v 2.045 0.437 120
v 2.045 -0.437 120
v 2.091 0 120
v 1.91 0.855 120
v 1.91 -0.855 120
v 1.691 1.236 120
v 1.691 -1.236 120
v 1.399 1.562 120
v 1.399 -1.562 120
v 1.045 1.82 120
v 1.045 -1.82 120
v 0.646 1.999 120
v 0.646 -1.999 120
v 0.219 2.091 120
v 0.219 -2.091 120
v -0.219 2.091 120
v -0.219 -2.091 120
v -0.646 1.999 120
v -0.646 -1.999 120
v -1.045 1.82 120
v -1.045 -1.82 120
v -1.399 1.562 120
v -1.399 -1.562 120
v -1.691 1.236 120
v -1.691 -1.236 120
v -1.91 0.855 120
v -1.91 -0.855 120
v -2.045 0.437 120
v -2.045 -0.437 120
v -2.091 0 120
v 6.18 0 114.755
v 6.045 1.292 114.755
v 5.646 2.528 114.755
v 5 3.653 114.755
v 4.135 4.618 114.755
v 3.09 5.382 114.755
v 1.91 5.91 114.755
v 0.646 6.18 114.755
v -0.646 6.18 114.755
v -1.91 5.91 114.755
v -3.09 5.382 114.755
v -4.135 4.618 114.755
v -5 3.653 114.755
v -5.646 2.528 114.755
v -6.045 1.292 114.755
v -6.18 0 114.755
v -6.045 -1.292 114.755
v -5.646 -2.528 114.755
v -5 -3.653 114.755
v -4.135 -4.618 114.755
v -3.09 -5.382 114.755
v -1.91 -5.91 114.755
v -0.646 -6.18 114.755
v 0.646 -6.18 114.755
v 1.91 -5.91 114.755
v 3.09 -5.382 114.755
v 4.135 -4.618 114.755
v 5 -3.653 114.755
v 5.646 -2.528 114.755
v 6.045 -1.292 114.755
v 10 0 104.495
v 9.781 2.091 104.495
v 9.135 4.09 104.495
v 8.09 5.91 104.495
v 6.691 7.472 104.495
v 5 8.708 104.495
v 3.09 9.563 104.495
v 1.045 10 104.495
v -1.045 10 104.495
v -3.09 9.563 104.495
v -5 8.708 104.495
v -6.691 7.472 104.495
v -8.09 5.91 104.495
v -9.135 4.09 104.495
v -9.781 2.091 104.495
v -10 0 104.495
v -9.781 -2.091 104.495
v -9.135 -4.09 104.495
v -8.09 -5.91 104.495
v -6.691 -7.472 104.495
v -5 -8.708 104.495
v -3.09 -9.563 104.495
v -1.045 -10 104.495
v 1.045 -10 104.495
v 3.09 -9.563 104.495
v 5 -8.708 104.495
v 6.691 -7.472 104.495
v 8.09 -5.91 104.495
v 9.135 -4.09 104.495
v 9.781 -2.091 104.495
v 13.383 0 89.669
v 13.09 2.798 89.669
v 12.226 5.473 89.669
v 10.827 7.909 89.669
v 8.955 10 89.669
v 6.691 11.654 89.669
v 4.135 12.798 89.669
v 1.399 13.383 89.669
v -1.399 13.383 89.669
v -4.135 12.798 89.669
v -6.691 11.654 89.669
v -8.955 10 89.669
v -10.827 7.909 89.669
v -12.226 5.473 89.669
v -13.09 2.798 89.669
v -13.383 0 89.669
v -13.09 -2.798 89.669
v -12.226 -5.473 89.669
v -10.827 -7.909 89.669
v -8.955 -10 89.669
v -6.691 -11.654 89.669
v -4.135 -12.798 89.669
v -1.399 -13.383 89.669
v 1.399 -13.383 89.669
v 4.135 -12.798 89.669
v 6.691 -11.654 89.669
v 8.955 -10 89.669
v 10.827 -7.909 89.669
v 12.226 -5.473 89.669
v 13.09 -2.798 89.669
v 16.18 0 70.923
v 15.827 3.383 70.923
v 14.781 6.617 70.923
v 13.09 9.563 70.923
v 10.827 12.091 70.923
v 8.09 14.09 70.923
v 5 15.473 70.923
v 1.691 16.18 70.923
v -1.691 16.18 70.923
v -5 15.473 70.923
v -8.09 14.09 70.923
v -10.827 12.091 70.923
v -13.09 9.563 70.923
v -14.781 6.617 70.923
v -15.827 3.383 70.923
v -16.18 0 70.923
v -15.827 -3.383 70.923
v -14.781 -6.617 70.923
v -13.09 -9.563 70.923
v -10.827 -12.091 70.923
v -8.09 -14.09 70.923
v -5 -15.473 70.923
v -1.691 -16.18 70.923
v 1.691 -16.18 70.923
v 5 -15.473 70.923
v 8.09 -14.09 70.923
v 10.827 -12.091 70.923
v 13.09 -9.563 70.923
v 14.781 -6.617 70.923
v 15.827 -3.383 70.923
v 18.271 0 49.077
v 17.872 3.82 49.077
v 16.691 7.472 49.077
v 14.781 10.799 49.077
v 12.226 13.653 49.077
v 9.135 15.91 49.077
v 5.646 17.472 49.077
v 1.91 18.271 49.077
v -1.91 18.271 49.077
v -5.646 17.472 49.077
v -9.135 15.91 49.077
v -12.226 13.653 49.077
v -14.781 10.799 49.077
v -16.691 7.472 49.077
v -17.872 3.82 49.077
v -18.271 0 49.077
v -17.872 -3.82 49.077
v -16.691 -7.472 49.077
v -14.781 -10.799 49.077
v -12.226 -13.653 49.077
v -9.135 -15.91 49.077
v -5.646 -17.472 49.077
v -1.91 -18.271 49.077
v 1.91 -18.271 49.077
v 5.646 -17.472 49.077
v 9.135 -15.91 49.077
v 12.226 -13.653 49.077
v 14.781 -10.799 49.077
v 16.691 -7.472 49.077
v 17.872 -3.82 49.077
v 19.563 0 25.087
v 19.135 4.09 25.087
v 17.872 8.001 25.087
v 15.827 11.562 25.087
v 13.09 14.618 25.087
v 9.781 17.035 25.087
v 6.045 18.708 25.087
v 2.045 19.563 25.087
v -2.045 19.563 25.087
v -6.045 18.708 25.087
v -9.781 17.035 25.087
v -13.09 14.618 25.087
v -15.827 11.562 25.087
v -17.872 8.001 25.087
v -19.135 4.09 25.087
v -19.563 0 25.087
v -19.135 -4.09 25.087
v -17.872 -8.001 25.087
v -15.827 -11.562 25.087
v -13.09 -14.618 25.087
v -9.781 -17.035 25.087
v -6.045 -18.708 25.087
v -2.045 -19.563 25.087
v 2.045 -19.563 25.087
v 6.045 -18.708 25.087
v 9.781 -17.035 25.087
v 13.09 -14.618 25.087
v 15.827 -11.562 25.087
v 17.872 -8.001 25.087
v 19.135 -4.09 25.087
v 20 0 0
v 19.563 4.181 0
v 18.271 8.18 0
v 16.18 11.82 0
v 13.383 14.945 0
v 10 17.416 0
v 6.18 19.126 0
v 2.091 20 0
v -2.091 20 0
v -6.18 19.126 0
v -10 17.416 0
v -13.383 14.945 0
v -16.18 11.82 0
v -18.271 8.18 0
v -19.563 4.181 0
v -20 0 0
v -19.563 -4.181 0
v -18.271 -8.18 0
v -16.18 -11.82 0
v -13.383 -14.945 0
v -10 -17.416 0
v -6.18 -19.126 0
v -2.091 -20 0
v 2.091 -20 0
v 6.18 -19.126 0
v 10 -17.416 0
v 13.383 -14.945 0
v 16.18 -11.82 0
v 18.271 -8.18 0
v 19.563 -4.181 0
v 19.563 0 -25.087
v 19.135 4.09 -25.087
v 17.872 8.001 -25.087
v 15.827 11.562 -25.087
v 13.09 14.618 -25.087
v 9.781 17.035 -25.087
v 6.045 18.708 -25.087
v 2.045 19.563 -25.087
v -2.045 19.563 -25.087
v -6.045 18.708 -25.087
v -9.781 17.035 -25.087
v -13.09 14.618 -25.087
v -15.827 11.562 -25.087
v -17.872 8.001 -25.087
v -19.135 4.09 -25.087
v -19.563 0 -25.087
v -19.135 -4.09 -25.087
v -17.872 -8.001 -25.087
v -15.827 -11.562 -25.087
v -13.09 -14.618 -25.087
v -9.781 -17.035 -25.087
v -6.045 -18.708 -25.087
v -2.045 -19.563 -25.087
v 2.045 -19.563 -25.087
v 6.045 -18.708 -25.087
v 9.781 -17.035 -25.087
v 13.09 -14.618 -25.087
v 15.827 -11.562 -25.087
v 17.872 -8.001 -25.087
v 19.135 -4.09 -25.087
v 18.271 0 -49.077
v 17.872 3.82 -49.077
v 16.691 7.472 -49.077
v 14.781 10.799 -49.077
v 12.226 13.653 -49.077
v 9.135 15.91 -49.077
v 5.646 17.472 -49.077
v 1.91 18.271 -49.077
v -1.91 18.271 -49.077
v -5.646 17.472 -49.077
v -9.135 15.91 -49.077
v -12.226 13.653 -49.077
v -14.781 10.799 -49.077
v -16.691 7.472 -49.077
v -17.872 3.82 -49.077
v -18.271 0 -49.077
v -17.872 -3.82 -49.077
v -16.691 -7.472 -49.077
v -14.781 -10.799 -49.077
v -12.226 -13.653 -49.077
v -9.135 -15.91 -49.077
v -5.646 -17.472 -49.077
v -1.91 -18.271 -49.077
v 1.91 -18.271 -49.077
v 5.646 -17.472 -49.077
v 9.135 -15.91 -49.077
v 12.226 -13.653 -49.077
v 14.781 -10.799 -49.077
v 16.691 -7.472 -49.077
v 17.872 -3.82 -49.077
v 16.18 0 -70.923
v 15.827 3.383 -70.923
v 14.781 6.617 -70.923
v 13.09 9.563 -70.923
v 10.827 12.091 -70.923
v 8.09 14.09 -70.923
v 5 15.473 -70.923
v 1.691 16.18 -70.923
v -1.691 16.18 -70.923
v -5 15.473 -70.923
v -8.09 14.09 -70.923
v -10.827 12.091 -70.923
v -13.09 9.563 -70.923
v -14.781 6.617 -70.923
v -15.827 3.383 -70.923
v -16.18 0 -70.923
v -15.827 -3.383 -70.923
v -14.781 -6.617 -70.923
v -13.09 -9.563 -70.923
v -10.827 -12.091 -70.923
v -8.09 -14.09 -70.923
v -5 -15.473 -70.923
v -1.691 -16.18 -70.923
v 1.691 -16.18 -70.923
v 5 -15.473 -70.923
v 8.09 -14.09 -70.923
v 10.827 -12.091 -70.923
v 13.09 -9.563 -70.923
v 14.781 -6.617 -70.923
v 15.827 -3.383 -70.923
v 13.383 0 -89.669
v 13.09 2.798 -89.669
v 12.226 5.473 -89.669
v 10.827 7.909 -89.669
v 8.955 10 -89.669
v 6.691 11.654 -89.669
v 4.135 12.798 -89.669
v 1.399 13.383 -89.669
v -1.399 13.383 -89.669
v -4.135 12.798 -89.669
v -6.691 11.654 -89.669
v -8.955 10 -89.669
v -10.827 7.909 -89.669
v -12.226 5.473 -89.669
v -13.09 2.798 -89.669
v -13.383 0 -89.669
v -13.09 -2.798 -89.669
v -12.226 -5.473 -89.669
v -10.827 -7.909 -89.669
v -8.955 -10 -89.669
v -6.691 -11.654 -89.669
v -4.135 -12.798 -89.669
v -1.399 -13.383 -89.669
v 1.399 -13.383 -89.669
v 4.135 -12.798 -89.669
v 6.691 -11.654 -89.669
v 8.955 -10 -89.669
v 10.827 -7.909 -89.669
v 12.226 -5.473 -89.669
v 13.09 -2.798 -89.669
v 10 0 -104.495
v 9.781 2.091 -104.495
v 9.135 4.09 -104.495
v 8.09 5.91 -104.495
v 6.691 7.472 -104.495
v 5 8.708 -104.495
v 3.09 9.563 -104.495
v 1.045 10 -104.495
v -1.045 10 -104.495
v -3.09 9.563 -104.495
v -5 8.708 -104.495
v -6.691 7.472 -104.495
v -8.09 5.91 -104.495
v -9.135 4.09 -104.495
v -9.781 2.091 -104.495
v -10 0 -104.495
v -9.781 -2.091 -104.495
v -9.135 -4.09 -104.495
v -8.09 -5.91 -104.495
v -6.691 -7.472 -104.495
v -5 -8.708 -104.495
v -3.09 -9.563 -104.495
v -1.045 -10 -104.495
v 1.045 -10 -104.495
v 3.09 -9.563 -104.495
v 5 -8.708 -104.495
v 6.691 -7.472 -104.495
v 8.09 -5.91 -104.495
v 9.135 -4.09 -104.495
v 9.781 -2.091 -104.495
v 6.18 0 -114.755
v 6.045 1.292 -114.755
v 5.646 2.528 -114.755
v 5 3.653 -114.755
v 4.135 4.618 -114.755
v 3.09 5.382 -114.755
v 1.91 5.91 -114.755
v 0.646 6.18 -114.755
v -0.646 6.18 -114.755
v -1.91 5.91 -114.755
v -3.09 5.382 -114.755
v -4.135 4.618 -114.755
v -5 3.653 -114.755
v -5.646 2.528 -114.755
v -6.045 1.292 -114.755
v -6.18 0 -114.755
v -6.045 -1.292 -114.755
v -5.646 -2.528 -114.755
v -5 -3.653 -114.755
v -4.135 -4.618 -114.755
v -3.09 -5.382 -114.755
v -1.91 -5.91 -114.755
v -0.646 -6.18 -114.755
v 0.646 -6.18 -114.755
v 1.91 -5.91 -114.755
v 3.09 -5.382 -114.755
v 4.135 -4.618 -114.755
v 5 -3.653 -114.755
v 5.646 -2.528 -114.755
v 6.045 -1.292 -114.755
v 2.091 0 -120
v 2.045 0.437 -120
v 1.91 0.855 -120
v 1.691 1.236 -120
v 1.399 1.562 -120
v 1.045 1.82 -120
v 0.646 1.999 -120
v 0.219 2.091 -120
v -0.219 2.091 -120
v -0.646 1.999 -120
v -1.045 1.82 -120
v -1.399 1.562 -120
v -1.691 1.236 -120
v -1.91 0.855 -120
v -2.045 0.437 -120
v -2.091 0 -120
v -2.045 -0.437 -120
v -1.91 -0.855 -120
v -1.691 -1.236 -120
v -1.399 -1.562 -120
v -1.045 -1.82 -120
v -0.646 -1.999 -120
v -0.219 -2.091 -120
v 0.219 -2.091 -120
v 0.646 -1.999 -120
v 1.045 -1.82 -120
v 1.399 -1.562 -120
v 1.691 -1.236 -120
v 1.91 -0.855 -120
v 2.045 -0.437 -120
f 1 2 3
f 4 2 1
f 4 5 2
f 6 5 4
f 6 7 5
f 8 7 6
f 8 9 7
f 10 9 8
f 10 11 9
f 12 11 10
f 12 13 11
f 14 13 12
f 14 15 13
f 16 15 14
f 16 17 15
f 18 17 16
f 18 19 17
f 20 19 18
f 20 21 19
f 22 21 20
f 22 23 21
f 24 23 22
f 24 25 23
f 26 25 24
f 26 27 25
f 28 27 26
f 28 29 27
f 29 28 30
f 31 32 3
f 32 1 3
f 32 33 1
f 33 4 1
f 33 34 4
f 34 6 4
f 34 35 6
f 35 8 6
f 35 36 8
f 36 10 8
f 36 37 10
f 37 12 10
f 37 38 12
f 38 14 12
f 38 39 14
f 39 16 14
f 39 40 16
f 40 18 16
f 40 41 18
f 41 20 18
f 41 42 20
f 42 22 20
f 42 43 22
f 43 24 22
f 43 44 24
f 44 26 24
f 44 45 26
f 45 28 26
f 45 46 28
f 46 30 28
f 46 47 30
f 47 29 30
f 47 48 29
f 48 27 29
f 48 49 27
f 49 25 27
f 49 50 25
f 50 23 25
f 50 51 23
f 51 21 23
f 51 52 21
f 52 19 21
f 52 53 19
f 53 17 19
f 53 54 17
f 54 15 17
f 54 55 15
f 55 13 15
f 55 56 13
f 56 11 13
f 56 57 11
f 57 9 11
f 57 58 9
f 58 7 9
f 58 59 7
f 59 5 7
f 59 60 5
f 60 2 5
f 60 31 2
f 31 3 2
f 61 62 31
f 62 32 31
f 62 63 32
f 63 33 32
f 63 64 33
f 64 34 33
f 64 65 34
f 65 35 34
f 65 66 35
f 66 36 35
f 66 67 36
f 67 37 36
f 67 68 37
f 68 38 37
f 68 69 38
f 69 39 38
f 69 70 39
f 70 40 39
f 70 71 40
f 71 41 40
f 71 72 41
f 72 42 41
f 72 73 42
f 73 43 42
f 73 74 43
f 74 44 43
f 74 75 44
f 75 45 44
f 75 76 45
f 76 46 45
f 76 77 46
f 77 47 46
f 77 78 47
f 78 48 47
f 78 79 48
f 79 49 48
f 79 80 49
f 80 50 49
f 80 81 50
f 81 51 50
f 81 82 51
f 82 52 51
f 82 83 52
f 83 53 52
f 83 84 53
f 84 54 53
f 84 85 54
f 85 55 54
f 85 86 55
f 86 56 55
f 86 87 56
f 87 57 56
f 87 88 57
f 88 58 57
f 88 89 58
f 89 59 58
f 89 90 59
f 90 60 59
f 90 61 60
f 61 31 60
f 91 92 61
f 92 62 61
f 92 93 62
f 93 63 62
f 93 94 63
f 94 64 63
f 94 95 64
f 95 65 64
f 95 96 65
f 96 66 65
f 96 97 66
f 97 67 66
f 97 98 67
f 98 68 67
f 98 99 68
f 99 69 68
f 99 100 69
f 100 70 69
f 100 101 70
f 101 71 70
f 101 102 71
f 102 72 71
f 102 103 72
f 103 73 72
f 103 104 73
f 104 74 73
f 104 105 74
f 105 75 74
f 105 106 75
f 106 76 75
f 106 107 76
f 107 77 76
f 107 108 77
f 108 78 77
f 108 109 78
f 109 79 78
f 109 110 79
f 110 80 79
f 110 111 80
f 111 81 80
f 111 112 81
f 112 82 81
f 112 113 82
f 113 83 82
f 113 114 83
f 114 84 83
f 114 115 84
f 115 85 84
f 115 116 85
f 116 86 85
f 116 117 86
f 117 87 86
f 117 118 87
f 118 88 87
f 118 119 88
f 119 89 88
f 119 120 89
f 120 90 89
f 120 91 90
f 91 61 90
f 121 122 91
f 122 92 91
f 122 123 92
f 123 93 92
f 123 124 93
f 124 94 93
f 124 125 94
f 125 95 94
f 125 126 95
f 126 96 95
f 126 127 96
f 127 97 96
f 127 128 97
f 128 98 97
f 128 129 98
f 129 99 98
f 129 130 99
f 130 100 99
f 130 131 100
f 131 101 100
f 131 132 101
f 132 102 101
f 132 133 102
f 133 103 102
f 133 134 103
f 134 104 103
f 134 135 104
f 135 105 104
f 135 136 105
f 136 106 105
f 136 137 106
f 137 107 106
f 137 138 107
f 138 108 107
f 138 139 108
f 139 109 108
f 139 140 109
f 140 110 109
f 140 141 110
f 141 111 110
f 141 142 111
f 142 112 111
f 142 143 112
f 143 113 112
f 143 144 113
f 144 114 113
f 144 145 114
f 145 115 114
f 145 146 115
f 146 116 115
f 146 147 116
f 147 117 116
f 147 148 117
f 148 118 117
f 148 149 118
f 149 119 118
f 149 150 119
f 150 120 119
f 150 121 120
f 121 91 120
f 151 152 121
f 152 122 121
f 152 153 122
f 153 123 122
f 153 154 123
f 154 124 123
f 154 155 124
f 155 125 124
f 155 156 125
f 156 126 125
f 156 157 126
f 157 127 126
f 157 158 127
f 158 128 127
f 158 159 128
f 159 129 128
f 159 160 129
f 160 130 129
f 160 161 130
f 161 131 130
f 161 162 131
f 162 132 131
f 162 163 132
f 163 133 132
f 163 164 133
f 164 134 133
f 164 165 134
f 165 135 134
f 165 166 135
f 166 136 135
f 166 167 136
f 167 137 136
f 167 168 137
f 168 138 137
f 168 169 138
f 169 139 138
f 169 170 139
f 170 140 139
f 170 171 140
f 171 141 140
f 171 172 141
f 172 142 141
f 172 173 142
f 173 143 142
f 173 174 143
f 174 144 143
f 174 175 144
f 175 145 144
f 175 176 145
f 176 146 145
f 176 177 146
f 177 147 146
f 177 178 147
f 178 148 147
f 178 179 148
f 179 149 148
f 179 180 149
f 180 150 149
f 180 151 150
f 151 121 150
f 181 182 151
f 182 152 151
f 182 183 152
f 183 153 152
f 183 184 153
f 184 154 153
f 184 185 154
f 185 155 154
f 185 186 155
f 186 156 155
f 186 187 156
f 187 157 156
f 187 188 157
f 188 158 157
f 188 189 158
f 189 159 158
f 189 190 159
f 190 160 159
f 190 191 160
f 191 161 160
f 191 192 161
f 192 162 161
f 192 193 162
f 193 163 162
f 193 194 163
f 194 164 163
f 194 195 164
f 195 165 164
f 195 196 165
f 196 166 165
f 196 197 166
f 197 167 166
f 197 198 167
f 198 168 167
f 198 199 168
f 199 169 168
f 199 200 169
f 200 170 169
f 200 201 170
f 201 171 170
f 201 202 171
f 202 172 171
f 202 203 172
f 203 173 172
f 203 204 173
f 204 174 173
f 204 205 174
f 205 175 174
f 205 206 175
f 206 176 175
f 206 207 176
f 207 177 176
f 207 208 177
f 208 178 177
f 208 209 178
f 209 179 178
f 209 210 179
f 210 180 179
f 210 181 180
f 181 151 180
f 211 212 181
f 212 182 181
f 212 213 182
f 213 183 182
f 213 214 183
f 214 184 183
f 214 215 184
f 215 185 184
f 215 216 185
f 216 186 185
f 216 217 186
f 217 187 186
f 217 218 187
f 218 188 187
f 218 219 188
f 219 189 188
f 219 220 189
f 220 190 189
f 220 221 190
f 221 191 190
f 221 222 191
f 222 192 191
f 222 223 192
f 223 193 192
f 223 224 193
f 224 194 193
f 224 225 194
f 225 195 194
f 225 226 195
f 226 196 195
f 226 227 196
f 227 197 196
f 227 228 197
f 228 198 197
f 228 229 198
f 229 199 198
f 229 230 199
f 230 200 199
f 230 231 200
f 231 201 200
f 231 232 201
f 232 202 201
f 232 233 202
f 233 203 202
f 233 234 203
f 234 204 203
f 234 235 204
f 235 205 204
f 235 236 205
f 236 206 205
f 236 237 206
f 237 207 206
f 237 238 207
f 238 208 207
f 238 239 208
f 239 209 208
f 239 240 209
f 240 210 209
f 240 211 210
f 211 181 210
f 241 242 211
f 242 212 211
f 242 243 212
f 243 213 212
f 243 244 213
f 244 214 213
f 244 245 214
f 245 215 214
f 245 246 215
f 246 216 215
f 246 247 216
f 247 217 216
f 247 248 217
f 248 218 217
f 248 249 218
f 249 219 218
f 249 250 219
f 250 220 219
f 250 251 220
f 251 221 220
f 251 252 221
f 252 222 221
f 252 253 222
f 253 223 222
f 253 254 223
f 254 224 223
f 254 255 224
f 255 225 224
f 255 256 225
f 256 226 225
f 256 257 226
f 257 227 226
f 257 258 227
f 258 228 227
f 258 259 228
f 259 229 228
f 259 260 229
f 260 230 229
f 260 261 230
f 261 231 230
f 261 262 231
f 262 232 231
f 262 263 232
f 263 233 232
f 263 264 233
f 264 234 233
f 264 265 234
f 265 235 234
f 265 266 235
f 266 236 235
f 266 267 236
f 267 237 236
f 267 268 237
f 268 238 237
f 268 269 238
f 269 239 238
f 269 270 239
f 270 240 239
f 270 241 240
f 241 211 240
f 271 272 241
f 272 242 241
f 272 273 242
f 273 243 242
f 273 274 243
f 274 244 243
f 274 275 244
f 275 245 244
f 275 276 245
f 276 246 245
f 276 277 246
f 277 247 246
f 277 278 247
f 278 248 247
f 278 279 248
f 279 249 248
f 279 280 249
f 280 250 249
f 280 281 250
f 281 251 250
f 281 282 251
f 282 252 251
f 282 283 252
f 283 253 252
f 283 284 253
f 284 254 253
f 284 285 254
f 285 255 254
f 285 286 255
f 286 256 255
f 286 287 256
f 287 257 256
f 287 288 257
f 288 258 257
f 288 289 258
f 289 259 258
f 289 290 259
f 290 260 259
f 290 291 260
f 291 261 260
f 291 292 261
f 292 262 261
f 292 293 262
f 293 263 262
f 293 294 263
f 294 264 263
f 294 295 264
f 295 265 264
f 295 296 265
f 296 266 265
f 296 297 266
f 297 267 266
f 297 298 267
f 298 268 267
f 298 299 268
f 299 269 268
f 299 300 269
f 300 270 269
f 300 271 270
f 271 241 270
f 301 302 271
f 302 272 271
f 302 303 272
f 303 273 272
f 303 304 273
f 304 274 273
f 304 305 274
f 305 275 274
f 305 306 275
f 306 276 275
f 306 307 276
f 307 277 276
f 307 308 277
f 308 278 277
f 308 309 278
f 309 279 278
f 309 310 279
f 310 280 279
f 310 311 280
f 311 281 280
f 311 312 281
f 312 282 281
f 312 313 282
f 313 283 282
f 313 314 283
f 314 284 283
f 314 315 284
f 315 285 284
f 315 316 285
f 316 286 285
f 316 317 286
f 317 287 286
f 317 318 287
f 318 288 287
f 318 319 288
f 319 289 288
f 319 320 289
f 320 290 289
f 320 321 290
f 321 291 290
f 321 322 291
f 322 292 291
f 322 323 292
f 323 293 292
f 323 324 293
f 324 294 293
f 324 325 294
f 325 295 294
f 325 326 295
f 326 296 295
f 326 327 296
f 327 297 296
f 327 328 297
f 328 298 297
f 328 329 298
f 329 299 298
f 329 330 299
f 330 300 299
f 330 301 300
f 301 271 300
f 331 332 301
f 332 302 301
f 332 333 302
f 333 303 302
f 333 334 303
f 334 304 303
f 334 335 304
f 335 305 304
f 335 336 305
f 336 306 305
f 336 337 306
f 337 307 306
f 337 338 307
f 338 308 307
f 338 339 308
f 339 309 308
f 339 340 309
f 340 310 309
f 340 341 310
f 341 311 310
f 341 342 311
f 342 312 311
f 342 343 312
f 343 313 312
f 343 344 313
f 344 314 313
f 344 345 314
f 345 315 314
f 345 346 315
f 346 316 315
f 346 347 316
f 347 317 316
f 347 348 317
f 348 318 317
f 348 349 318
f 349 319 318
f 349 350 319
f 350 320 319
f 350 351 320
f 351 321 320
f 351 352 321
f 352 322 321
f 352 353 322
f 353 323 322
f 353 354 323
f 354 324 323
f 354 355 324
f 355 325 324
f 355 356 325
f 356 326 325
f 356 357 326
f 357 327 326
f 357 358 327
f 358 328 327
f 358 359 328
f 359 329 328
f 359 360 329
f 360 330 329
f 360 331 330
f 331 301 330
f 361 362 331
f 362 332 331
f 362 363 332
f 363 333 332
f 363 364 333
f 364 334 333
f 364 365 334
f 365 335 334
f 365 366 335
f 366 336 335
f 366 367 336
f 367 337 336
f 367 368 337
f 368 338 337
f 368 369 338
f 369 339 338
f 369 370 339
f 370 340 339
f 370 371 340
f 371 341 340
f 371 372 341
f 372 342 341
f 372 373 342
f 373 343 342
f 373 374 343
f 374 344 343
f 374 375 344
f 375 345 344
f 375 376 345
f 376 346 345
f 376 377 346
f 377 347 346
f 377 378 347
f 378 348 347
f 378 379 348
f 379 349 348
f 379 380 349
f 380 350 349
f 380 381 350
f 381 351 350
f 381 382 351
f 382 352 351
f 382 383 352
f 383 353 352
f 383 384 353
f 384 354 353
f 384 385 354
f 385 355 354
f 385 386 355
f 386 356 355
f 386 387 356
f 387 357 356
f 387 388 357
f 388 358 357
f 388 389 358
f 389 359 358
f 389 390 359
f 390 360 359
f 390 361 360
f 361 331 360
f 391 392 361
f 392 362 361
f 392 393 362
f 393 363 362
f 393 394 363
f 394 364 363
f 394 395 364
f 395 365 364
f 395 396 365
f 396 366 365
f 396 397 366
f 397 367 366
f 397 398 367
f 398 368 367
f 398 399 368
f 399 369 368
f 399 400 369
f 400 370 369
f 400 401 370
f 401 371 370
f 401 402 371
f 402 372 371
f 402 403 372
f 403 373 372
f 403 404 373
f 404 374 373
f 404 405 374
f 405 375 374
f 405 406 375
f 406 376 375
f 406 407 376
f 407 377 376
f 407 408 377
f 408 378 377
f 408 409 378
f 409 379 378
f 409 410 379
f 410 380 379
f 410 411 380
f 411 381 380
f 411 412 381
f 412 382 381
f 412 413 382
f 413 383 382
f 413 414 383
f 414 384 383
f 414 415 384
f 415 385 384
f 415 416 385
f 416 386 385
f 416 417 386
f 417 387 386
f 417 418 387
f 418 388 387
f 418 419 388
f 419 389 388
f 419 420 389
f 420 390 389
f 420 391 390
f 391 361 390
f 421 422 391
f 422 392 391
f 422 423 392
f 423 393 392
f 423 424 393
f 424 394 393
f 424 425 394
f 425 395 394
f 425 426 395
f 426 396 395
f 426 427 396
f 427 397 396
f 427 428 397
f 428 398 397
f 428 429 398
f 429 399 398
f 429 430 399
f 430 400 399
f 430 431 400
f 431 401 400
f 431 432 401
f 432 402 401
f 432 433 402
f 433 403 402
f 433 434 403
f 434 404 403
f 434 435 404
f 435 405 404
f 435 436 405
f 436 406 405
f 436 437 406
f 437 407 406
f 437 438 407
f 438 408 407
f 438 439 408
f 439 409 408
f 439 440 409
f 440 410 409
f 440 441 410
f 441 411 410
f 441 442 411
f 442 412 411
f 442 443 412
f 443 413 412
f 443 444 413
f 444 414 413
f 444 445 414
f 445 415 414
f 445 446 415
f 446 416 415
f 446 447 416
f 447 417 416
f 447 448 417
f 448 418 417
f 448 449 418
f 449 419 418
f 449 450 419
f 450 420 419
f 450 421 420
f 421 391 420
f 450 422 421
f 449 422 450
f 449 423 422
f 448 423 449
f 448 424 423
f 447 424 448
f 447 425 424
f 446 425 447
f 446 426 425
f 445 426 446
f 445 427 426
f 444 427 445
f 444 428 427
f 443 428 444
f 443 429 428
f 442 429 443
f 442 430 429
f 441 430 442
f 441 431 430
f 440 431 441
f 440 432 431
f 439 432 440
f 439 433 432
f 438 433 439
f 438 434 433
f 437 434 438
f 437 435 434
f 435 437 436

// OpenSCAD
scale([2,2,6])

resize([20,20,40])
sphere(r=30,$fn=30);

//linear_extrude(height=3)

//text("Hola");
